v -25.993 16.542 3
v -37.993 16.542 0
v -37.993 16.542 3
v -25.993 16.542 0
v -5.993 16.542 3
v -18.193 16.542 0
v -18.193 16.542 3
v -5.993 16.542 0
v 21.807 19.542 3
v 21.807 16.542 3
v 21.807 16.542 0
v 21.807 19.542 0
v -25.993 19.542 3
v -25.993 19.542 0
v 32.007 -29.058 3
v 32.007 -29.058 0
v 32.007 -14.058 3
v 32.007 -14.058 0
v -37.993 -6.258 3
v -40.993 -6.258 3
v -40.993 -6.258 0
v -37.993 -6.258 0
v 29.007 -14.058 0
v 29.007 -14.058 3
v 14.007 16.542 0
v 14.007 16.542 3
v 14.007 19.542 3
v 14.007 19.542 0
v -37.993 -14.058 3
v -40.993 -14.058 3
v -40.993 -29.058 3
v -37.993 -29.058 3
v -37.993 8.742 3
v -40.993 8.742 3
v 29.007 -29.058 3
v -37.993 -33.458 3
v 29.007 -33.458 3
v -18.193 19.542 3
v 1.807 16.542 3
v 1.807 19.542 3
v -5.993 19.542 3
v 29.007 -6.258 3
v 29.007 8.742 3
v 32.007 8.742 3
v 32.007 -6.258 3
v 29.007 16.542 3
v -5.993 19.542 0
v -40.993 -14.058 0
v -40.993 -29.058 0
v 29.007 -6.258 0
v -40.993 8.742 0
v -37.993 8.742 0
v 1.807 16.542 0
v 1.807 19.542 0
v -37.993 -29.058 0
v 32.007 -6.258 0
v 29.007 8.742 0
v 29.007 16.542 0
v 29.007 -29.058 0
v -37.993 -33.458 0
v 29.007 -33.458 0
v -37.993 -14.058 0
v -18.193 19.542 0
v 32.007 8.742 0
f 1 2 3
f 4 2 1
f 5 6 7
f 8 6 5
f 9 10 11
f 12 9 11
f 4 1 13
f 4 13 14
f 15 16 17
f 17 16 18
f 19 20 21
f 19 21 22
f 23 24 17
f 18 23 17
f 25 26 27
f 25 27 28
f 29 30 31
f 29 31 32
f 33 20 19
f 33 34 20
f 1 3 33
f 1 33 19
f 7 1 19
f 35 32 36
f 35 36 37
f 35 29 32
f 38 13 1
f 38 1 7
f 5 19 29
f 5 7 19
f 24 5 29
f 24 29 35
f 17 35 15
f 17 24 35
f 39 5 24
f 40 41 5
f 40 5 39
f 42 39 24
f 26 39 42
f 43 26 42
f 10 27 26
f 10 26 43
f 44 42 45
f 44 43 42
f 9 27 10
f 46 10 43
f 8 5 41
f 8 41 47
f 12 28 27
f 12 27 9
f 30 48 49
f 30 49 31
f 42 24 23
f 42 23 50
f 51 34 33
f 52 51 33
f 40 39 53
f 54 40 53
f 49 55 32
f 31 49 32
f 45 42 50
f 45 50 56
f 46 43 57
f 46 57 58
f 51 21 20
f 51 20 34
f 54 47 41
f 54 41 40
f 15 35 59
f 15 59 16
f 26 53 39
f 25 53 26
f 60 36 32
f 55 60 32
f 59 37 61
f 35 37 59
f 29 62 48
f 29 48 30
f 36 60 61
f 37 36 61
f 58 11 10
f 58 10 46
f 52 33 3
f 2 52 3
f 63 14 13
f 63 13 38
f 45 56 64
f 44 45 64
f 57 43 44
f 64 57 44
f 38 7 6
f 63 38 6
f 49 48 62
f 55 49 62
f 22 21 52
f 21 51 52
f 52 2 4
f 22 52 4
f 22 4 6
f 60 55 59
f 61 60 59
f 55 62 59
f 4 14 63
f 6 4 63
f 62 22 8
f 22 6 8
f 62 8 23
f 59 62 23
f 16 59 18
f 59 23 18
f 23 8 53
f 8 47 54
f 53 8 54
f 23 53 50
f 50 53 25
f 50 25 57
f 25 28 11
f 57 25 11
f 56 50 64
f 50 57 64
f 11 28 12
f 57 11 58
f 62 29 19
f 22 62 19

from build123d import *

# Parameters (mm, degrees)
SKETCH1_W           = 73
SKETCH1_H           = 50
BOSS_EXTRUDE1_DEPTH = 3
SKETCH2_W           = 3
SKETCH2_H           = 7.8
CUT_EXTRUDE1_DEPTH  = 53.999062732
LPATTERN1_COUNT     = 3
LPATTERN1_PITCH     = 22.8
SKETCH3_W           = 3
SKETCH3_H           = 7.8
CUT_EXTRUDE2_DEPTH  = 53.999062732
LPATTERN2_COUNT     = 4
LPATTERN2_PITCH     = 22.8
SKETCH6_W           = 3
SKETCH6_H           = 19.4
CUT_EXTRUDE3_DEPTH  = 10
SKETCH7_W           = 7.8
SKETCH7_H           = 3
BOSS_EXTRUDE2_DEPTH = 3
LPATTERN3_COUNT     = 3
LPATTERN3_PITCH     = 20
SKETCH8_W           = 3
SKETCH8_H           = 15
BOSS_EXTRUDE3_DEPTH = 3


with BuildPart() as part:
    # Sketch1 → Boss-Extrude1 (new body)
    with BuildSketch(Plane.XY):
        with Locations((-4.493460648, -8.457986111)):
            Rectangle(SKETCH1_W, SKETCH1_H)
    extrude(amount=BOSS_EXTRUDE1_DEPTH)

    # Sketch2 → Cut-Extrude1 (cut, through all)
    with BuildSketch(Plane.XY.offset(3)):
        with Locations((-39.493460648, 12.642013889)):
            Rectangle(SKETCH2_W, SKETCH2_H)
    cut_extrude1 = extrude(amount=-CUT_EXTRUDE1_DEPTH, mode=Mode.SUBTRACT)

    # LPattern1: Cut-Extrude1 ×3
    with Locations(*[(0, -i * LPATTERN1_PITCH, 0) for i in range(1, LPATTERN1_COUNT)]):
        add(cut_extrude1, mode=Mode.SUBTRACT)

    # Sketch3 → Cut-Extrude2 (cut, through all)
    with BuildSketch(Plane.XY.offset(3)):
        with Locations((30.506539352, 12.642013889)):
            Rectangle(SKETCH3_W, SKETCH3_H)
    cut_extrude2 = extrude(amount=-CUT_EXTRUDE2_DEPTH, mode=Mode.SUBTRACT)

    # LPattern2: Cut-Extrude2 ×4
    with Locations(*[(0, -i * LPATTERN2_PITCH, 0) for i in range(1, LPATTERN2_COUNT)]):
        add(cut_extrude2, mode=Mode.SUBTRACT)

    # Sketch6 → Cut-Extrude3 (cut)
    with BuildSketch(Plane.XY.offset(3)):
        with Locations((-39.493460648, -23.757986111)):
            Rectangle(SKETCH6_W, SKETCH6_H)
    extrude(amount=-CUT_EXTRUDE3_DEPTH, mode=Mode.SUBTRACT)

    # Sketch7 → Boss-Extrude2 (add)
    with BuildSketch(Plane(origin=(0, 16.542013889, 0), x_dir=(1, 0, 0), z_dir=(0, 1, 0))):
        with Locations((-22.093460648, -1.5)):
            Rectangle(SKETCH7_W, SKETCH7_H)
    boss_extrude2 = extrude(amount=BOSS_EXTRUDE2_DEPTH)

    # LPattern3: Boss-Extrude2 ×3
    with Locations(*[(i * LPATTERN3_PITCH, 0, 0) for i in range(1, LPATTERN3_COUNT)]):
        add(boss_extrude2)

    # Sketch8 → Boss-Extrude3 (add)
    with BuildSketch(Plane.ZY.offset(37.993460648)):
        with Locations((1.5, -21.557986111)):
            Rectangle(SKETCH8_W, SKETCH8_H)
    extrude(amount=BOSS_EXTRUDE3_DEPTH)


solid = part.part
